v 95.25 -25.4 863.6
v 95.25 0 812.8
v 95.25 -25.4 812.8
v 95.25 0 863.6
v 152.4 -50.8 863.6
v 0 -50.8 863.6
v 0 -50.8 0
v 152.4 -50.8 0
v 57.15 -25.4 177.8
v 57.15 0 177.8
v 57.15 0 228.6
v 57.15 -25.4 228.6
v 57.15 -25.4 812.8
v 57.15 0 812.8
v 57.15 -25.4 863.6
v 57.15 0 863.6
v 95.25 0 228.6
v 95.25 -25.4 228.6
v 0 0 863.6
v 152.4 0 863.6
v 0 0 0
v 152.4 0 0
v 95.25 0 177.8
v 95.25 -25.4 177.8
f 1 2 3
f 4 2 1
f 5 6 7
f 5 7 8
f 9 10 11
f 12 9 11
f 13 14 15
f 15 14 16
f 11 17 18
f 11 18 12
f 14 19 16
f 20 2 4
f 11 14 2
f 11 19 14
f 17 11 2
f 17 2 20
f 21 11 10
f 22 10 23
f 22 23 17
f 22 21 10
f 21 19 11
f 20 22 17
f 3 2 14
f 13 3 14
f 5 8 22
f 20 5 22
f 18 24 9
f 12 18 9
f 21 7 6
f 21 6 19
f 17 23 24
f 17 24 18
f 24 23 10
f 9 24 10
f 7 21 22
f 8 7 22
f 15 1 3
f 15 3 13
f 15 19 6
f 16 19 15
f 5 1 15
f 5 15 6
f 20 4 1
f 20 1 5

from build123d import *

# Parameters (mm, degrees)
F0_W     = 152.4
F0_H     = 50.8
F1_DEPTH = 863.6
F2_W     = 38.1
F2_H     = 50.8
F3_DEPTH = 25.4
F4_W     = 38.1
F4_H     = 50.8
F5_DEPTH = 25.4


with BuildPart() as f1:
    # F0 (on Top) → F1 (new body)
    with BuildSketch(Plane.XY):
        with Locations((76.2, -25.4)):
            Rectangle(F0_W, F0_H)
    extrude(amount=F1_DEPTH)

    # F2 (on face) → F3 (cut)
    with BuildSketch(Plane(origin=(0, 0, 0), x_dir=(-1, 0, 0), z_dir=(0, 1, 0))):
        with Locations((-76.2, 838.2)):
            Rectangle(F2_W, F2_H)
    extrude(amount=-F3_DEPTH, mode=Mode.SUBTRACT)

    # F4 (on face) → F5 (cut)
    with BuildSketch(Plane(origin=(0, 0, 0), x_dir=(-1, 0, 0), z_dir=(0, 1, 0))):
        with Locations((-76.2, 203.2)):
            Rectangle(F4_W, F4_H)
    extrude(amount=-F5_DEPTH, mode=Mode.SUBTRACT)


solid = f1.part
